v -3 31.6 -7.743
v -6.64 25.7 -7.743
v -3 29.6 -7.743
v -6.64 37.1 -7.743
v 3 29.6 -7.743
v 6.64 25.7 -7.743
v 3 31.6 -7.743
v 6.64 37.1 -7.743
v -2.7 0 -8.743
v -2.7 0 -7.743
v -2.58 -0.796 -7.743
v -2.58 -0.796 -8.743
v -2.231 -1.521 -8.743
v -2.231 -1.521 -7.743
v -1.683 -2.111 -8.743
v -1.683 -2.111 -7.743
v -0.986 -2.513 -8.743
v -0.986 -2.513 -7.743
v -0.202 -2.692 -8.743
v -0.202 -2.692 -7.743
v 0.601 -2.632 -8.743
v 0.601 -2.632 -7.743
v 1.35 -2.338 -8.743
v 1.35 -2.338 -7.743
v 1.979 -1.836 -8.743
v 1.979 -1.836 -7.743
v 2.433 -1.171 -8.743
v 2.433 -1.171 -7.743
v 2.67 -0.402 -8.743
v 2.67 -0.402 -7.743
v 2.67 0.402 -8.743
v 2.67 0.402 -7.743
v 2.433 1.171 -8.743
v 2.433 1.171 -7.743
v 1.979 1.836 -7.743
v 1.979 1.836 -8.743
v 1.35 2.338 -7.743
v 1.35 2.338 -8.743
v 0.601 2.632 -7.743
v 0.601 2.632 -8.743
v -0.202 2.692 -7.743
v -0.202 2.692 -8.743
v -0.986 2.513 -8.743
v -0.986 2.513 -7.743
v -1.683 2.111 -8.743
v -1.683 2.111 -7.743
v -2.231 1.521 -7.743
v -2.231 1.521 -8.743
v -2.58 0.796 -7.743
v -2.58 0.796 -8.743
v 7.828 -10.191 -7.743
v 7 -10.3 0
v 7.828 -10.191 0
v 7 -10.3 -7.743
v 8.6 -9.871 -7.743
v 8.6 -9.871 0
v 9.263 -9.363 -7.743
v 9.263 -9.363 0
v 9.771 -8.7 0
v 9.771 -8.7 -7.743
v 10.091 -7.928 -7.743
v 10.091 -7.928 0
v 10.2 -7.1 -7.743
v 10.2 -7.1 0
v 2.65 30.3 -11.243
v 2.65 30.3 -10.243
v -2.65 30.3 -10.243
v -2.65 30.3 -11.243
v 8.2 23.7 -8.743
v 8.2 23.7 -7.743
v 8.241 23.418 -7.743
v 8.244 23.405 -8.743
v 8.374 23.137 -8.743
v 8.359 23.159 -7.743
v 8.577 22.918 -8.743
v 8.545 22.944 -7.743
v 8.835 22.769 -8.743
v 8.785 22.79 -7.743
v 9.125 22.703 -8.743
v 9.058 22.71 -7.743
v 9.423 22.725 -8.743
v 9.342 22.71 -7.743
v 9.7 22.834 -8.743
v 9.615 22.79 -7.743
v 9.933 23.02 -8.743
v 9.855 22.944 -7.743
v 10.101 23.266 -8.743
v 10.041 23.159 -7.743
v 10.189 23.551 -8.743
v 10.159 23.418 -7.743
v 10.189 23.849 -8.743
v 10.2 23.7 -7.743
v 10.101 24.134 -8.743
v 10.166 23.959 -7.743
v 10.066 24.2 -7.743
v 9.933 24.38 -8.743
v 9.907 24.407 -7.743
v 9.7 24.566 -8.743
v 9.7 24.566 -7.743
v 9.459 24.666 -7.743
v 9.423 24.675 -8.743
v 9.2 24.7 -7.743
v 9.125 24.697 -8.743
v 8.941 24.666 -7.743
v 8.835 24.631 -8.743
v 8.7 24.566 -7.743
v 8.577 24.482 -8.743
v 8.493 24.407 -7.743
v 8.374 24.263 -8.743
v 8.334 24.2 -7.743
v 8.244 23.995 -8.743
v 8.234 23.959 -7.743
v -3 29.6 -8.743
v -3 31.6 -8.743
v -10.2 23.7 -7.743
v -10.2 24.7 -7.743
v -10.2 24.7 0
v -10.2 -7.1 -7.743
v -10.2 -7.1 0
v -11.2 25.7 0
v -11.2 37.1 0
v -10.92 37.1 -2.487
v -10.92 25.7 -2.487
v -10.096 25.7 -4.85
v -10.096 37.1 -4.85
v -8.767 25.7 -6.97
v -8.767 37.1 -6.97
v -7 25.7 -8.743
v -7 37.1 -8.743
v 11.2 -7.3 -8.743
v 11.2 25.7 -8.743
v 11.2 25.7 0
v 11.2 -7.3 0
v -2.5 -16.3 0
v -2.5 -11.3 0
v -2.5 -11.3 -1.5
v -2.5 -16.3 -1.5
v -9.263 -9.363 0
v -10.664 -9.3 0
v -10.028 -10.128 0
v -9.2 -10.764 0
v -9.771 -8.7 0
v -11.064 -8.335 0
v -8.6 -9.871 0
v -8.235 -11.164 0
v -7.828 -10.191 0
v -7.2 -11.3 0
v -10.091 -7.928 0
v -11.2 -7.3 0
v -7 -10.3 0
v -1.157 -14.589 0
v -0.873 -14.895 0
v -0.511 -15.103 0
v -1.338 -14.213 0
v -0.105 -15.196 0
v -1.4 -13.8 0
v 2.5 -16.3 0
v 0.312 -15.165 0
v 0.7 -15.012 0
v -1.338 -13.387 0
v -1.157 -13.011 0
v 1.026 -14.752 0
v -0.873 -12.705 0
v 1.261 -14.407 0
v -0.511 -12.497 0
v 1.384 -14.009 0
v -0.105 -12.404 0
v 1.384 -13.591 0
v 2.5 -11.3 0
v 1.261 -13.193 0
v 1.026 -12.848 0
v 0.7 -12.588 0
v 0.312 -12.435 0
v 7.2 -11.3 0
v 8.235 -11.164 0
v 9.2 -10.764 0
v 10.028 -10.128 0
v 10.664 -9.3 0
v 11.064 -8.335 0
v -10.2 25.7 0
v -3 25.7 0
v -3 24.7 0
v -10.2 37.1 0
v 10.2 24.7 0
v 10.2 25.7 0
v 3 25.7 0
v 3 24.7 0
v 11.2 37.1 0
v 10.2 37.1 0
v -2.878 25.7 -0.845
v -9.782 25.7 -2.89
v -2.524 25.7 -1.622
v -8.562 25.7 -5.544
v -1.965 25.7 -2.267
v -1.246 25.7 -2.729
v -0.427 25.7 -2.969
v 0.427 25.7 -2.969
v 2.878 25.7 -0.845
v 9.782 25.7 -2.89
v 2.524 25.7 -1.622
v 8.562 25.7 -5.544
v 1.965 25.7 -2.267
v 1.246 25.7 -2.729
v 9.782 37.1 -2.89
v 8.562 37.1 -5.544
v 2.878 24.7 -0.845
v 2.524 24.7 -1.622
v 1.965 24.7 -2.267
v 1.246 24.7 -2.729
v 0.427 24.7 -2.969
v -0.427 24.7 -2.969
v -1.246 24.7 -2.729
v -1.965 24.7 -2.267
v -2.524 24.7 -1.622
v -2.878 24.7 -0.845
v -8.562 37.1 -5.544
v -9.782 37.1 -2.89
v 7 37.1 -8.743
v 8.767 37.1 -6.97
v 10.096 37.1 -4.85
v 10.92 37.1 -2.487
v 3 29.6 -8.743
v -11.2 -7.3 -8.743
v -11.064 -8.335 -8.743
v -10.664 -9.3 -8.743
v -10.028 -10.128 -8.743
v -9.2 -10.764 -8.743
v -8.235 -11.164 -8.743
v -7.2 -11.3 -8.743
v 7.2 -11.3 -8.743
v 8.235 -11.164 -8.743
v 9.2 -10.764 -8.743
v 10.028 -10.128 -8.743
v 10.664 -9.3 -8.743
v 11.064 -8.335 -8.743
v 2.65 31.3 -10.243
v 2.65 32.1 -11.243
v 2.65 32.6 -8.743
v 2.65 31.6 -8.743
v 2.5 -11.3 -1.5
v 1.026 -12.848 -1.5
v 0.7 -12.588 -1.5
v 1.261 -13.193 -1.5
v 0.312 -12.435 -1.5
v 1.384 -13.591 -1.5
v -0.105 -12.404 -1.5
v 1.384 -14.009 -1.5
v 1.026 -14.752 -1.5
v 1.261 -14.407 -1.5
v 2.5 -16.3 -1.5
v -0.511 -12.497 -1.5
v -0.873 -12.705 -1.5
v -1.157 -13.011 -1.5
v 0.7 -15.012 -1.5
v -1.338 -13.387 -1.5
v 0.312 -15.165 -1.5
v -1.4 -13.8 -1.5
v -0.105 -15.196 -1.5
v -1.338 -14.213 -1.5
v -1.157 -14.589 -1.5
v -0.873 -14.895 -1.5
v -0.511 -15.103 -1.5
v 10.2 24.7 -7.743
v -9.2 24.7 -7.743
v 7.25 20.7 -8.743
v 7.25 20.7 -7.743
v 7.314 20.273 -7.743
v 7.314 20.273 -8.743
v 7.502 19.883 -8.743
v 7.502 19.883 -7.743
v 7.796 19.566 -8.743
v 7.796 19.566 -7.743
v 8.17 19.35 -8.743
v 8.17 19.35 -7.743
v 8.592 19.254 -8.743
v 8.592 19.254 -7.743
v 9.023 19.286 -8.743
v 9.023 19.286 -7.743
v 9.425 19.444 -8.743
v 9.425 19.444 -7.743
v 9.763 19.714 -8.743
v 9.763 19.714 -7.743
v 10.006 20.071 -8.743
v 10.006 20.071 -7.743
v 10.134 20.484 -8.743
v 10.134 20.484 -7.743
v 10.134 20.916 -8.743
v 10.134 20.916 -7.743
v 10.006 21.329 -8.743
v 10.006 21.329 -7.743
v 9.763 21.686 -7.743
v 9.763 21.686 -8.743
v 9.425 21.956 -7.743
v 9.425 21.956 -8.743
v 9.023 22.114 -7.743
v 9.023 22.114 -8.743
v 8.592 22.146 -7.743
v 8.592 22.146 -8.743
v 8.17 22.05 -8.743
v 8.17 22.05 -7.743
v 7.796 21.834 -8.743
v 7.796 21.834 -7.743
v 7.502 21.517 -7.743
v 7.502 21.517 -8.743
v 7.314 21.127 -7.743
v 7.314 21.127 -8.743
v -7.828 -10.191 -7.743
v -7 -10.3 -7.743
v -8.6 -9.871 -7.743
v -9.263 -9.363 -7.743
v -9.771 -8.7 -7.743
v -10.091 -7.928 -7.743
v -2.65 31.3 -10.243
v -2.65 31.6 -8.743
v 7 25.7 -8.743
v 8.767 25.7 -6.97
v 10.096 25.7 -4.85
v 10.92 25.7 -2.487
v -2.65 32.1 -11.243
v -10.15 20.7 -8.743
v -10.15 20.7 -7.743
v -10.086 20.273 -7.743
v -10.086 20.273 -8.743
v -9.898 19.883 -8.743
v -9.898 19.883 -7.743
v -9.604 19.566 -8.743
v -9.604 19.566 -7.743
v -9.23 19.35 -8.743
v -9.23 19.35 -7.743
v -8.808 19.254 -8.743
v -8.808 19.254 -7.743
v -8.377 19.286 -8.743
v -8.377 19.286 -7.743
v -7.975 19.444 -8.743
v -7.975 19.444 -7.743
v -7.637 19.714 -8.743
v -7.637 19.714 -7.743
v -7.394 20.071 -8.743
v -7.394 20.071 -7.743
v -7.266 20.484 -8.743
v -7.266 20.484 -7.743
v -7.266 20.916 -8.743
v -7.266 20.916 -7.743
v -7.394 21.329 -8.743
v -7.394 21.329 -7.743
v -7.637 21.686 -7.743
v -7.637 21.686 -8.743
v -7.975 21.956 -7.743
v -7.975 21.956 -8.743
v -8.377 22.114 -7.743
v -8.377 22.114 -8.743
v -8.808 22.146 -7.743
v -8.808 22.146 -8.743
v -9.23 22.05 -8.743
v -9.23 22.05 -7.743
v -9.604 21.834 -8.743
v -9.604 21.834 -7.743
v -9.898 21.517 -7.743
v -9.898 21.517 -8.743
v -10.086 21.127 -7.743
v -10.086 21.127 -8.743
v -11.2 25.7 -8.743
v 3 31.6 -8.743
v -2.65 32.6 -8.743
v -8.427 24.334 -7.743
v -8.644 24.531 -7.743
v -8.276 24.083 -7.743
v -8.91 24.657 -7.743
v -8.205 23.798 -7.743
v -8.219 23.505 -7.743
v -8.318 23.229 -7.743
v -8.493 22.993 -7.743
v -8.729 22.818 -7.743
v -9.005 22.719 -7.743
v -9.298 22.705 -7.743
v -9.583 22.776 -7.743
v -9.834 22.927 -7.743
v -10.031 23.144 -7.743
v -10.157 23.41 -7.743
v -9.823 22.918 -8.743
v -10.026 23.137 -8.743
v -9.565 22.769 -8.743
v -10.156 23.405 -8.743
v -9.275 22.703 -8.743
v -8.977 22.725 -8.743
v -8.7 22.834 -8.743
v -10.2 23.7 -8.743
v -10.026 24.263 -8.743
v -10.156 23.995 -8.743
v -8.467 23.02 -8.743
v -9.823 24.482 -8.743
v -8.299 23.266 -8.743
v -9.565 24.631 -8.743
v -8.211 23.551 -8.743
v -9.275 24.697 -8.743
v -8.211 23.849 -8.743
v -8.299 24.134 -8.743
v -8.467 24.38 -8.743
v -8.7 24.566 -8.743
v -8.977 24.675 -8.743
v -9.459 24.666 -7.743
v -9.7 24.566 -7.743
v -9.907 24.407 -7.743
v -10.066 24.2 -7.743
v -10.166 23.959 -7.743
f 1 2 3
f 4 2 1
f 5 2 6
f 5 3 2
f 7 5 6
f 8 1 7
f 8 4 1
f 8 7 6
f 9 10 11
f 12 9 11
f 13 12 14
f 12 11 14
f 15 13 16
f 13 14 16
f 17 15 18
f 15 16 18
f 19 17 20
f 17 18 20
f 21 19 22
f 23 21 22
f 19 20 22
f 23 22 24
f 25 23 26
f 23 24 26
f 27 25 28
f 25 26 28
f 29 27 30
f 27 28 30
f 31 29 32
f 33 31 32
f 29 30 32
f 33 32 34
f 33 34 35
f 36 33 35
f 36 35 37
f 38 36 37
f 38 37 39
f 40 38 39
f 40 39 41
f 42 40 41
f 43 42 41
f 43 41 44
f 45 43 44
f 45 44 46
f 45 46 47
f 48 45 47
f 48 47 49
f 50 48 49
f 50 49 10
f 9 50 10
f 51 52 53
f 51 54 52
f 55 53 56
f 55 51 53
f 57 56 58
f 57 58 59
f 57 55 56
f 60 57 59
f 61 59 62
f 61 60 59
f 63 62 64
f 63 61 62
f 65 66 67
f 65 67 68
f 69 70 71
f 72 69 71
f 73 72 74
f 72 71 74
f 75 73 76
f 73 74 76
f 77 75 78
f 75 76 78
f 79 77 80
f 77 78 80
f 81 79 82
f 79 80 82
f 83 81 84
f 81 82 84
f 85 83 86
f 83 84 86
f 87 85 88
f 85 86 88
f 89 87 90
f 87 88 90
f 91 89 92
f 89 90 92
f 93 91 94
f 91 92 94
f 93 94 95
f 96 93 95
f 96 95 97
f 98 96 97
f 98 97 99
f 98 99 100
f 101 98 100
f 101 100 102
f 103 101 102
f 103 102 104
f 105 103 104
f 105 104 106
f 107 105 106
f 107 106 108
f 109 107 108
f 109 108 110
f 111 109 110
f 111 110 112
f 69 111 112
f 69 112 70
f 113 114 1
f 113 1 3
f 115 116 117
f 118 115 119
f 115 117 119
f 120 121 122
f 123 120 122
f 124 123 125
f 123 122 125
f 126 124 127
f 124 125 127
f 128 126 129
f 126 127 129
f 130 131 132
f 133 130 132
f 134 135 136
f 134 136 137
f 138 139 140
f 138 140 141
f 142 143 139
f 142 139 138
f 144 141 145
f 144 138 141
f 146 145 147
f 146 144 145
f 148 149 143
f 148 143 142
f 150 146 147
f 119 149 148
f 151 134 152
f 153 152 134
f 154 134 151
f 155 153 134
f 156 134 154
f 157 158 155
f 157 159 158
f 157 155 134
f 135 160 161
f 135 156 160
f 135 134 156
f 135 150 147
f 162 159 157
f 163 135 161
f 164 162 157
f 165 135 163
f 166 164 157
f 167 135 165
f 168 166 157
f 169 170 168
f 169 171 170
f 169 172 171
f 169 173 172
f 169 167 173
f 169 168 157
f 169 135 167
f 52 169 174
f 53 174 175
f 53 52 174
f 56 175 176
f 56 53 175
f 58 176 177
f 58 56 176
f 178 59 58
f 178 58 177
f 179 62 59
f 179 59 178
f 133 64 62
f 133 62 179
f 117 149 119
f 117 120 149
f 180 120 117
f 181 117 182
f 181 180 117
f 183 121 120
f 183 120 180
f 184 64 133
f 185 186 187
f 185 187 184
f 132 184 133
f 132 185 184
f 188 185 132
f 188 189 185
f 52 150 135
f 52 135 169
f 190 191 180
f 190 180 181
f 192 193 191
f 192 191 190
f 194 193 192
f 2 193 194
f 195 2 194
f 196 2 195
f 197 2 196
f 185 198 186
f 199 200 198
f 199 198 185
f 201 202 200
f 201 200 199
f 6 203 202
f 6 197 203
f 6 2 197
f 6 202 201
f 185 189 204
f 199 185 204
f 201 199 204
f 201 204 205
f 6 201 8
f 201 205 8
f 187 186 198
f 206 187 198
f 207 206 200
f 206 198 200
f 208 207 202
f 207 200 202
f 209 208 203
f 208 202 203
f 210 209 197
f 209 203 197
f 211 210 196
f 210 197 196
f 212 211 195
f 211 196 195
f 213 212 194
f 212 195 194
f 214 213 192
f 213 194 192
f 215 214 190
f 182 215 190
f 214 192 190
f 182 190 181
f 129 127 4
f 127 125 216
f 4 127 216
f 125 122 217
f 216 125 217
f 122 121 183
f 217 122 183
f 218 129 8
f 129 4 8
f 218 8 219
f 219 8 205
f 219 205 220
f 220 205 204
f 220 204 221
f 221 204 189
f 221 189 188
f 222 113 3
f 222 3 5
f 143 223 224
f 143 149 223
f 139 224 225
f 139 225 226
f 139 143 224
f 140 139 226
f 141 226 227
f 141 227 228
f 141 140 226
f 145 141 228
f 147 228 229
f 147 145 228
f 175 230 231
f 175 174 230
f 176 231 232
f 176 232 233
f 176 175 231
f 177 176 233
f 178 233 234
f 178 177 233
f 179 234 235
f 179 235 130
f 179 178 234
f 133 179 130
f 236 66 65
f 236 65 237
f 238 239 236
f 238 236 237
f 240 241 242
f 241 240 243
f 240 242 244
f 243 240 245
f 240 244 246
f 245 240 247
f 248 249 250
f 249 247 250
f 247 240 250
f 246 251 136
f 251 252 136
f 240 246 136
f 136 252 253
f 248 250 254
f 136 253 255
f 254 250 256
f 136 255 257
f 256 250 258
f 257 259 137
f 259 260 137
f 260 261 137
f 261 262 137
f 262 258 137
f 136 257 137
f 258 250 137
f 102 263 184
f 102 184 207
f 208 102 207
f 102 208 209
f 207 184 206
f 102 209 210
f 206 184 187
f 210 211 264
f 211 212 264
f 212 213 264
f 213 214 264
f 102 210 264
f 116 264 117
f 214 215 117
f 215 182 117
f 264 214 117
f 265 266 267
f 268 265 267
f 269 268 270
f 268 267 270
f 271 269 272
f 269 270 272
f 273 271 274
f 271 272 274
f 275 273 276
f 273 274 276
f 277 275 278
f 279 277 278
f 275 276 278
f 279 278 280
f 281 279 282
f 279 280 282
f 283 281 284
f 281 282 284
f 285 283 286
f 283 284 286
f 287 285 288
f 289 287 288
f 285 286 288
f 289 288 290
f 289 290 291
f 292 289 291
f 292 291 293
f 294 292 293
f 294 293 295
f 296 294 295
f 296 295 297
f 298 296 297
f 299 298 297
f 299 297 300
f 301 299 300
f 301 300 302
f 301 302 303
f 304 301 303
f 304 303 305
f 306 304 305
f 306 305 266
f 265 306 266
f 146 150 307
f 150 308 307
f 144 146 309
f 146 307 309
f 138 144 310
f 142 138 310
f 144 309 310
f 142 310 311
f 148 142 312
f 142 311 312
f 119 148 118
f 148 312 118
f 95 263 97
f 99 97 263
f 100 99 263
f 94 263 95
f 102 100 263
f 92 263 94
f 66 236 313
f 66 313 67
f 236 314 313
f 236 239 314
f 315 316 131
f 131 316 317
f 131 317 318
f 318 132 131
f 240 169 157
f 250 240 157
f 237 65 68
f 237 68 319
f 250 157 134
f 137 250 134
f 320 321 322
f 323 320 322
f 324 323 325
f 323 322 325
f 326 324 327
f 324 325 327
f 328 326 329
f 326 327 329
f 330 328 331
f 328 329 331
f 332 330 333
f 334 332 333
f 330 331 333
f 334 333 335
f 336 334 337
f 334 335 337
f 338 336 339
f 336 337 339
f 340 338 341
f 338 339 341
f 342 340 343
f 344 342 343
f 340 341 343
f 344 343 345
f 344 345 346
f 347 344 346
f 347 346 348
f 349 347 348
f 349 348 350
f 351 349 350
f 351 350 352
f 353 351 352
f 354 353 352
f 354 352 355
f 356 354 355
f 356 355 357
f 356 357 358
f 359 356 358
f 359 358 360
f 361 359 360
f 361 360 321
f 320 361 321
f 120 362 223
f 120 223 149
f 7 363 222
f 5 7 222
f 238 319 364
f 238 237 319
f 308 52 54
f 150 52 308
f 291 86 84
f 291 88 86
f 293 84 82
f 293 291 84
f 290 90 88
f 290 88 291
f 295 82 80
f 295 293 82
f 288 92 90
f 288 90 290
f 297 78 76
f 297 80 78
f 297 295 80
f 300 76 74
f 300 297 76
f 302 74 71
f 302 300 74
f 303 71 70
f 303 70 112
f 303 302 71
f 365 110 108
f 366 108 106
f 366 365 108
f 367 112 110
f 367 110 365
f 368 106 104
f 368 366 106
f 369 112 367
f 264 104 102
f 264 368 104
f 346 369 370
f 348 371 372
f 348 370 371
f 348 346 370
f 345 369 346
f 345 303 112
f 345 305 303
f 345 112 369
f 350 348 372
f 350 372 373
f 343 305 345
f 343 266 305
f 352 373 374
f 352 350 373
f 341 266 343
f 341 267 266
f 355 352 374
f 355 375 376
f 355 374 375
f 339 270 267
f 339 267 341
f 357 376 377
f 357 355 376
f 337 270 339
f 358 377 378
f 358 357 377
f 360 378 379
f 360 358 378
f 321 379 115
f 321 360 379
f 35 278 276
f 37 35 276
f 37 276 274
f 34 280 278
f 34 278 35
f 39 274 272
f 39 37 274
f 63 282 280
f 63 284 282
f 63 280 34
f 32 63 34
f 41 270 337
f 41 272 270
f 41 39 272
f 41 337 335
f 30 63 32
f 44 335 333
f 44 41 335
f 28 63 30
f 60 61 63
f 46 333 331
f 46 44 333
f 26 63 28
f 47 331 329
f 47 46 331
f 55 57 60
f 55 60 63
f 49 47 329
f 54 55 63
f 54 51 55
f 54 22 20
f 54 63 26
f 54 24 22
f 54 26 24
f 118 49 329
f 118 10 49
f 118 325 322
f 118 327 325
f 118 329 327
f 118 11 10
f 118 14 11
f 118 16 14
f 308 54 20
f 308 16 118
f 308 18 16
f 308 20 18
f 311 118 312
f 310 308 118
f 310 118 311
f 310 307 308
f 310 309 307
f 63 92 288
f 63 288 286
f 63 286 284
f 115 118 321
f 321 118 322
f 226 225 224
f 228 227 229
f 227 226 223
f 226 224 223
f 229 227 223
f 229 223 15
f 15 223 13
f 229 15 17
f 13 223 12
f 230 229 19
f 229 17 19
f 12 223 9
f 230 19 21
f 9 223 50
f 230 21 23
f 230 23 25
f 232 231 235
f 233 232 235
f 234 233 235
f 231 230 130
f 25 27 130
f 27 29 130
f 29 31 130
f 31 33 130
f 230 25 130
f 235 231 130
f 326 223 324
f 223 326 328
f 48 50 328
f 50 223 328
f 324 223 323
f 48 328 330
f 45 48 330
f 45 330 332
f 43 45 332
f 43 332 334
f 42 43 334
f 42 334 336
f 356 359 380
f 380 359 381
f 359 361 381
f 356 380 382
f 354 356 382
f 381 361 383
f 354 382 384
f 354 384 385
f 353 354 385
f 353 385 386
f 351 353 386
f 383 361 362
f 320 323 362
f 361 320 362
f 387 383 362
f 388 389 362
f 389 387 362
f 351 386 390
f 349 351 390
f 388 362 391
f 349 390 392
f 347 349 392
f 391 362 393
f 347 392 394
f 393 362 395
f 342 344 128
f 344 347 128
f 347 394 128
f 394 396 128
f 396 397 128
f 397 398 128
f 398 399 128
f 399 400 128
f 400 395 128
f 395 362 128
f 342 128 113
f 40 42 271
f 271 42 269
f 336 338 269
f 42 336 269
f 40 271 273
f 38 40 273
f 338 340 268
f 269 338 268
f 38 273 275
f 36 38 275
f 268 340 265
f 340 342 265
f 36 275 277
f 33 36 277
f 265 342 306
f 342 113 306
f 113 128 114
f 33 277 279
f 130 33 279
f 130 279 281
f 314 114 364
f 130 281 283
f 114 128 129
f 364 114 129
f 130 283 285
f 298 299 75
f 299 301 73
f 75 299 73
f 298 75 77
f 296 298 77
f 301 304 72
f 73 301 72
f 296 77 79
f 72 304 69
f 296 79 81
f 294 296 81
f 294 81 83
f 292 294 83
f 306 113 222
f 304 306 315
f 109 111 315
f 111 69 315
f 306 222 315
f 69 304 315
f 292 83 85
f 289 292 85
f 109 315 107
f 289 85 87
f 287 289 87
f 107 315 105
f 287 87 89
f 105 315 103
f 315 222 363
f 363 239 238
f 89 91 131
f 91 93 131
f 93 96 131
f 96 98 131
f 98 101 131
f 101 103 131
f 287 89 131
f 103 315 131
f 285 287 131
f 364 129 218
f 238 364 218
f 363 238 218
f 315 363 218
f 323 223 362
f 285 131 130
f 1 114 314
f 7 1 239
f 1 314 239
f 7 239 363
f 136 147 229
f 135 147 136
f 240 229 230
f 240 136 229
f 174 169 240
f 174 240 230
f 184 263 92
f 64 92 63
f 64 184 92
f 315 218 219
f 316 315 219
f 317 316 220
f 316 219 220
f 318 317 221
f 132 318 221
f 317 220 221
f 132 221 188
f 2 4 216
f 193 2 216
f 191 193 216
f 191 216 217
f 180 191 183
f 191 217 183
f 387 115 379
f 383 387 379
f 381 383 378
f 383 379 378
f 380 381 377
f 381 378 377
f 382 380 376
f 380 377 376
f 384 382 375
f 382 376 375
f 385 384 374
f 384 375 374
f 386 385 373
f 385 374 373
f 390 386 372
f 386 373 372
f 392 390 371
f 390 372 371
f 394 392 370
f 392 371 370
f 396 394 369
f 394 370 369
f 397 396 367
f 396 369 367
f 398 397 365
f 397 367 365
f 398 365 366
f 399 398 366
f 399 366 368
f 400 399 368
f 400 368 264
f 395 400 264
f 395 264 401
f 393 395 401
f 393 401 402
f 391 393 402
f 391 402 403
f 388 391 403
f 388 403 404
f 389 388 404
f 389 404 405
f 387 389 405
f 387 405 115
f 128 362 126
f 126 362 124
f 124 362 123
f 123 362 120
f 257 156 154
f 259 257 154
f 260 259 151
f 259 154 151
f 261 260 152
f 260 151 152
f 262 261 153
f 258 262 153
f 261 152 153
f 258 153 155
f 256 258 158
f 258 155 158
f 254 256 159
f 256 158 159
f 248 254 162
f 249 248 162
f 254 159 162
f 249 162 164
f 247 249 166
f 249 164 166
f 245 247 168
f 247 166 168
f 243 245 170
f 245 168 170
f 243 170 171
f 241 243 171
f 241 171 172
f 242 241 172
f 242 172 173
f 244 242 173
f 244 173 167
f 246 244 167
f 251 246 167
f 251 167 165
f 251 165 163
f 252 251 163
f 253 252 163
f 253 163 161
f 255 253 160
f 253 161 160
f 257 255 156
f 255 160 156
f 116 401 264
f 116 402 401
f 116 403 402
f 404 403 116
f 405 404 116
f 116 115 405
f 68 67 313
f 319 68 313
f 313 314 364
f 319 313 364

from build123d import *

# Parameters (mm, degrees)
PAD029_DEPTH    = 11.4
SKETCH042_W     = 22.4
SKETCH042_H     = 8.7429971978
PAD030_DEPTH    = 37
SKETCH043_W     = 5
SKETCH043_H     = 5
SKETCH043_R     = 1.4
PAD031_DEPTH    = 1.5
SKETCH044_R     = 2.7
SKETCH044_R_2   = 1.45
SKETCH044_R_3   = 1
POCKET007_DEPTH = 8.75
POCKET010_DEPTH = 11.4
SKETCH055_W     = 20.4
SKETCH055_H     = 35
POCKET011_DEPTH = 7.743
FILLET012_R     = 3.2
FILLET013_R     = 4
SKETCH056_R     = 3
POCKET012_DEPTH = 1
SKETCH057_W     = 6
SKETCH057_H     = 2
POCKET013_DEPTH = 1
PAD040_DEPTH    = 2.65


with BuildPart() as part:
    # Sketch041 → Pad029 (new body)
    with BuildSketch(Plane.XZ):
        with BuildLine():
            ThreePointArc((7, -8.7429971978), (10.0955435713, -4.8497422612), (11.2, 0))
            Line((-11.2, 0), (11.2, 0))
            ThreePointArc((-11.2, 0), (-10.0955435713, -4.8497422612), (-7, -8.7429971978))
            Line((7, -8.7429971978), (-7, -8.7429971978))
        make_face()
    extrude(amount=PAD029_DEPTH)

    # Sketch042 (on Face6 of Pad029) → Pad030 (join)
    with BuildSketch(Plane.XZ.offset(11.4)):
        with Locations((0, -4.3714985989)):
            Rectangle(SKETCH042_W, SKETCH042_H)
    extrude(amount=PAD030_DEPTH)

    # Sketch043 (on Face10 of Pad030) → Pad031 (join)
    with BuildSketch(Plane(origin=(0, 0, 0), x_dir=(-1, 0, 0), z_dir=(0, 0, 1))):
        with Locations((0, 50.9)):
            Rectangle(SKETCH043_W, SKETCH043_H)
        with Locations((0, 50.9)):
            Circle(SKETCH043_R, mode=Mode.SUBTRACT)
    extrude(amount=-PAD031_DEPTH)

    # Sketch044 (on Face15 of Pad031) → Pocket007 (cut)
    with BuildSketch(Plane(origin=(0, 0, 0), x_dir=(-1, 0, 0), z_dir=(0, 0, 1))):
        with Locations((0, 37.1)):
            Circle(SKETCH044_R)
        with Locations((8.7, 16.4)):
            Circle(SKETCH044_R_2)
        with Locations((-8.7, 16.4)):
            Circle(SKETCH044_R_2)
        with Locations((-9.2, 13.4)):
            Circle(SKETCH044_R_3)
        with Locations((9.2, 13.4)):
            Circle(SKETCH044_R_3)
    extrude(amount=-POCKET007_DEPTH, mode=Mode.SUBTRACT)

    # Sketch054 (on Face4 of Pocket007) → Pocket010 (cut)
    with BuildSketch(Plane(origin=(0, 0, 0), x_dir=(1, 0, 0), z_dir=(0, 1, 0))):
        with BuildLine():
            ThreePointArc((-6.6397284881, 7.7429971978), (-9.2672873749, 4.2611482855), (-10.2, 0))
            Line((-10.2, 0), (10.2, 0))
            ThreePointArc((10.2, 0), (9.2672873749, 4.2611482855), (6.6397284881, 7.7429971978))
            Line((-6.6397284881, 7.7429971978), (6.6397284881, 7.7429971978))
        make_face()
    extrude(amount=-POCKET010_DEPTH, mode=Mode.SUBTRACT)

    # Sketch055 (on Face3 of Pocket010) → Pocket011 (cut)
    with BuildSketch(Plane(origin=(0, 0, 0), x_dir=(-1, 0, 0), z_dir=(0, 0, 1))):
        with Locations((0, 29.9)):
            Rectangle(SKETCH055_W, SKETCH055_H)
    extrude(amount=-POCKET011_DEPTH, mode=Mode.SUBTRACT)

    # Fillet012
    fillet012_edges = [part.edges().sort_by_distance(p)[0] for p in [
        (10.2, -47.4, -3.8715),
        (-10.2, -47.4, -3.8715),
    ]]
    fillet(fillet012_edges, radius=FILLET012_R)

    # Fillet013
    fillet013_edges = [part.edges().sort_by_distance(p)[0] for p in [
        (11.2, -48.4, -4.371499),
        (-11.2, -48.4, -4.371499),
    ]]
    fillet(fillet013_edges, radius=FILLET013_R)

    # Sketch056 (on Face10 of Fillet013) → Pocket012 (cut)
    with BuildSketch(Plane(origin=(0, -11.4, 0), x_dir=(1, 0, 0), z_dir=(0, 1, 0))):
        Circle(SKETCH056_R)
    extrude(amount=-POCKET012_DEPTH, mode=Mode.SUBTRACT)

    # Sketch057 (on Face24 of Pocket012) → Pocket013 (cut)
    with BuildSketch(Plane(origin=(0, 0, -8.7429971978), x_dir=(1, 0, 0), z_dir=(0, 0, -1))):
        with Locations((0, 6.5)):
            Rectangle(SKETCH057_W, SKETCH057_H)
    extrude(amount=-POCKET013_DEPTH, mode=Mode.SUBTRACT)

    # Sketch058 → Pad040 (join, symmetric)
    with BuildSketch(Plane.YZ):
        Polygon((-5.5, -8.7429971978), (-5.8, -10.2429971978), (-6.8, -10.2429971978), (-6.8, -11.2429971978), (-5, -11.2429971978), (-4.5, -8.7429971978), align=None)
    extrude(amount=PAD040_DEPTH, both=True)


with BuildPart() as part_1:
    # Body020 placement: moved
    add(part.part.moved(Location((0, 37.1, 0))))


solid = part_1.part
